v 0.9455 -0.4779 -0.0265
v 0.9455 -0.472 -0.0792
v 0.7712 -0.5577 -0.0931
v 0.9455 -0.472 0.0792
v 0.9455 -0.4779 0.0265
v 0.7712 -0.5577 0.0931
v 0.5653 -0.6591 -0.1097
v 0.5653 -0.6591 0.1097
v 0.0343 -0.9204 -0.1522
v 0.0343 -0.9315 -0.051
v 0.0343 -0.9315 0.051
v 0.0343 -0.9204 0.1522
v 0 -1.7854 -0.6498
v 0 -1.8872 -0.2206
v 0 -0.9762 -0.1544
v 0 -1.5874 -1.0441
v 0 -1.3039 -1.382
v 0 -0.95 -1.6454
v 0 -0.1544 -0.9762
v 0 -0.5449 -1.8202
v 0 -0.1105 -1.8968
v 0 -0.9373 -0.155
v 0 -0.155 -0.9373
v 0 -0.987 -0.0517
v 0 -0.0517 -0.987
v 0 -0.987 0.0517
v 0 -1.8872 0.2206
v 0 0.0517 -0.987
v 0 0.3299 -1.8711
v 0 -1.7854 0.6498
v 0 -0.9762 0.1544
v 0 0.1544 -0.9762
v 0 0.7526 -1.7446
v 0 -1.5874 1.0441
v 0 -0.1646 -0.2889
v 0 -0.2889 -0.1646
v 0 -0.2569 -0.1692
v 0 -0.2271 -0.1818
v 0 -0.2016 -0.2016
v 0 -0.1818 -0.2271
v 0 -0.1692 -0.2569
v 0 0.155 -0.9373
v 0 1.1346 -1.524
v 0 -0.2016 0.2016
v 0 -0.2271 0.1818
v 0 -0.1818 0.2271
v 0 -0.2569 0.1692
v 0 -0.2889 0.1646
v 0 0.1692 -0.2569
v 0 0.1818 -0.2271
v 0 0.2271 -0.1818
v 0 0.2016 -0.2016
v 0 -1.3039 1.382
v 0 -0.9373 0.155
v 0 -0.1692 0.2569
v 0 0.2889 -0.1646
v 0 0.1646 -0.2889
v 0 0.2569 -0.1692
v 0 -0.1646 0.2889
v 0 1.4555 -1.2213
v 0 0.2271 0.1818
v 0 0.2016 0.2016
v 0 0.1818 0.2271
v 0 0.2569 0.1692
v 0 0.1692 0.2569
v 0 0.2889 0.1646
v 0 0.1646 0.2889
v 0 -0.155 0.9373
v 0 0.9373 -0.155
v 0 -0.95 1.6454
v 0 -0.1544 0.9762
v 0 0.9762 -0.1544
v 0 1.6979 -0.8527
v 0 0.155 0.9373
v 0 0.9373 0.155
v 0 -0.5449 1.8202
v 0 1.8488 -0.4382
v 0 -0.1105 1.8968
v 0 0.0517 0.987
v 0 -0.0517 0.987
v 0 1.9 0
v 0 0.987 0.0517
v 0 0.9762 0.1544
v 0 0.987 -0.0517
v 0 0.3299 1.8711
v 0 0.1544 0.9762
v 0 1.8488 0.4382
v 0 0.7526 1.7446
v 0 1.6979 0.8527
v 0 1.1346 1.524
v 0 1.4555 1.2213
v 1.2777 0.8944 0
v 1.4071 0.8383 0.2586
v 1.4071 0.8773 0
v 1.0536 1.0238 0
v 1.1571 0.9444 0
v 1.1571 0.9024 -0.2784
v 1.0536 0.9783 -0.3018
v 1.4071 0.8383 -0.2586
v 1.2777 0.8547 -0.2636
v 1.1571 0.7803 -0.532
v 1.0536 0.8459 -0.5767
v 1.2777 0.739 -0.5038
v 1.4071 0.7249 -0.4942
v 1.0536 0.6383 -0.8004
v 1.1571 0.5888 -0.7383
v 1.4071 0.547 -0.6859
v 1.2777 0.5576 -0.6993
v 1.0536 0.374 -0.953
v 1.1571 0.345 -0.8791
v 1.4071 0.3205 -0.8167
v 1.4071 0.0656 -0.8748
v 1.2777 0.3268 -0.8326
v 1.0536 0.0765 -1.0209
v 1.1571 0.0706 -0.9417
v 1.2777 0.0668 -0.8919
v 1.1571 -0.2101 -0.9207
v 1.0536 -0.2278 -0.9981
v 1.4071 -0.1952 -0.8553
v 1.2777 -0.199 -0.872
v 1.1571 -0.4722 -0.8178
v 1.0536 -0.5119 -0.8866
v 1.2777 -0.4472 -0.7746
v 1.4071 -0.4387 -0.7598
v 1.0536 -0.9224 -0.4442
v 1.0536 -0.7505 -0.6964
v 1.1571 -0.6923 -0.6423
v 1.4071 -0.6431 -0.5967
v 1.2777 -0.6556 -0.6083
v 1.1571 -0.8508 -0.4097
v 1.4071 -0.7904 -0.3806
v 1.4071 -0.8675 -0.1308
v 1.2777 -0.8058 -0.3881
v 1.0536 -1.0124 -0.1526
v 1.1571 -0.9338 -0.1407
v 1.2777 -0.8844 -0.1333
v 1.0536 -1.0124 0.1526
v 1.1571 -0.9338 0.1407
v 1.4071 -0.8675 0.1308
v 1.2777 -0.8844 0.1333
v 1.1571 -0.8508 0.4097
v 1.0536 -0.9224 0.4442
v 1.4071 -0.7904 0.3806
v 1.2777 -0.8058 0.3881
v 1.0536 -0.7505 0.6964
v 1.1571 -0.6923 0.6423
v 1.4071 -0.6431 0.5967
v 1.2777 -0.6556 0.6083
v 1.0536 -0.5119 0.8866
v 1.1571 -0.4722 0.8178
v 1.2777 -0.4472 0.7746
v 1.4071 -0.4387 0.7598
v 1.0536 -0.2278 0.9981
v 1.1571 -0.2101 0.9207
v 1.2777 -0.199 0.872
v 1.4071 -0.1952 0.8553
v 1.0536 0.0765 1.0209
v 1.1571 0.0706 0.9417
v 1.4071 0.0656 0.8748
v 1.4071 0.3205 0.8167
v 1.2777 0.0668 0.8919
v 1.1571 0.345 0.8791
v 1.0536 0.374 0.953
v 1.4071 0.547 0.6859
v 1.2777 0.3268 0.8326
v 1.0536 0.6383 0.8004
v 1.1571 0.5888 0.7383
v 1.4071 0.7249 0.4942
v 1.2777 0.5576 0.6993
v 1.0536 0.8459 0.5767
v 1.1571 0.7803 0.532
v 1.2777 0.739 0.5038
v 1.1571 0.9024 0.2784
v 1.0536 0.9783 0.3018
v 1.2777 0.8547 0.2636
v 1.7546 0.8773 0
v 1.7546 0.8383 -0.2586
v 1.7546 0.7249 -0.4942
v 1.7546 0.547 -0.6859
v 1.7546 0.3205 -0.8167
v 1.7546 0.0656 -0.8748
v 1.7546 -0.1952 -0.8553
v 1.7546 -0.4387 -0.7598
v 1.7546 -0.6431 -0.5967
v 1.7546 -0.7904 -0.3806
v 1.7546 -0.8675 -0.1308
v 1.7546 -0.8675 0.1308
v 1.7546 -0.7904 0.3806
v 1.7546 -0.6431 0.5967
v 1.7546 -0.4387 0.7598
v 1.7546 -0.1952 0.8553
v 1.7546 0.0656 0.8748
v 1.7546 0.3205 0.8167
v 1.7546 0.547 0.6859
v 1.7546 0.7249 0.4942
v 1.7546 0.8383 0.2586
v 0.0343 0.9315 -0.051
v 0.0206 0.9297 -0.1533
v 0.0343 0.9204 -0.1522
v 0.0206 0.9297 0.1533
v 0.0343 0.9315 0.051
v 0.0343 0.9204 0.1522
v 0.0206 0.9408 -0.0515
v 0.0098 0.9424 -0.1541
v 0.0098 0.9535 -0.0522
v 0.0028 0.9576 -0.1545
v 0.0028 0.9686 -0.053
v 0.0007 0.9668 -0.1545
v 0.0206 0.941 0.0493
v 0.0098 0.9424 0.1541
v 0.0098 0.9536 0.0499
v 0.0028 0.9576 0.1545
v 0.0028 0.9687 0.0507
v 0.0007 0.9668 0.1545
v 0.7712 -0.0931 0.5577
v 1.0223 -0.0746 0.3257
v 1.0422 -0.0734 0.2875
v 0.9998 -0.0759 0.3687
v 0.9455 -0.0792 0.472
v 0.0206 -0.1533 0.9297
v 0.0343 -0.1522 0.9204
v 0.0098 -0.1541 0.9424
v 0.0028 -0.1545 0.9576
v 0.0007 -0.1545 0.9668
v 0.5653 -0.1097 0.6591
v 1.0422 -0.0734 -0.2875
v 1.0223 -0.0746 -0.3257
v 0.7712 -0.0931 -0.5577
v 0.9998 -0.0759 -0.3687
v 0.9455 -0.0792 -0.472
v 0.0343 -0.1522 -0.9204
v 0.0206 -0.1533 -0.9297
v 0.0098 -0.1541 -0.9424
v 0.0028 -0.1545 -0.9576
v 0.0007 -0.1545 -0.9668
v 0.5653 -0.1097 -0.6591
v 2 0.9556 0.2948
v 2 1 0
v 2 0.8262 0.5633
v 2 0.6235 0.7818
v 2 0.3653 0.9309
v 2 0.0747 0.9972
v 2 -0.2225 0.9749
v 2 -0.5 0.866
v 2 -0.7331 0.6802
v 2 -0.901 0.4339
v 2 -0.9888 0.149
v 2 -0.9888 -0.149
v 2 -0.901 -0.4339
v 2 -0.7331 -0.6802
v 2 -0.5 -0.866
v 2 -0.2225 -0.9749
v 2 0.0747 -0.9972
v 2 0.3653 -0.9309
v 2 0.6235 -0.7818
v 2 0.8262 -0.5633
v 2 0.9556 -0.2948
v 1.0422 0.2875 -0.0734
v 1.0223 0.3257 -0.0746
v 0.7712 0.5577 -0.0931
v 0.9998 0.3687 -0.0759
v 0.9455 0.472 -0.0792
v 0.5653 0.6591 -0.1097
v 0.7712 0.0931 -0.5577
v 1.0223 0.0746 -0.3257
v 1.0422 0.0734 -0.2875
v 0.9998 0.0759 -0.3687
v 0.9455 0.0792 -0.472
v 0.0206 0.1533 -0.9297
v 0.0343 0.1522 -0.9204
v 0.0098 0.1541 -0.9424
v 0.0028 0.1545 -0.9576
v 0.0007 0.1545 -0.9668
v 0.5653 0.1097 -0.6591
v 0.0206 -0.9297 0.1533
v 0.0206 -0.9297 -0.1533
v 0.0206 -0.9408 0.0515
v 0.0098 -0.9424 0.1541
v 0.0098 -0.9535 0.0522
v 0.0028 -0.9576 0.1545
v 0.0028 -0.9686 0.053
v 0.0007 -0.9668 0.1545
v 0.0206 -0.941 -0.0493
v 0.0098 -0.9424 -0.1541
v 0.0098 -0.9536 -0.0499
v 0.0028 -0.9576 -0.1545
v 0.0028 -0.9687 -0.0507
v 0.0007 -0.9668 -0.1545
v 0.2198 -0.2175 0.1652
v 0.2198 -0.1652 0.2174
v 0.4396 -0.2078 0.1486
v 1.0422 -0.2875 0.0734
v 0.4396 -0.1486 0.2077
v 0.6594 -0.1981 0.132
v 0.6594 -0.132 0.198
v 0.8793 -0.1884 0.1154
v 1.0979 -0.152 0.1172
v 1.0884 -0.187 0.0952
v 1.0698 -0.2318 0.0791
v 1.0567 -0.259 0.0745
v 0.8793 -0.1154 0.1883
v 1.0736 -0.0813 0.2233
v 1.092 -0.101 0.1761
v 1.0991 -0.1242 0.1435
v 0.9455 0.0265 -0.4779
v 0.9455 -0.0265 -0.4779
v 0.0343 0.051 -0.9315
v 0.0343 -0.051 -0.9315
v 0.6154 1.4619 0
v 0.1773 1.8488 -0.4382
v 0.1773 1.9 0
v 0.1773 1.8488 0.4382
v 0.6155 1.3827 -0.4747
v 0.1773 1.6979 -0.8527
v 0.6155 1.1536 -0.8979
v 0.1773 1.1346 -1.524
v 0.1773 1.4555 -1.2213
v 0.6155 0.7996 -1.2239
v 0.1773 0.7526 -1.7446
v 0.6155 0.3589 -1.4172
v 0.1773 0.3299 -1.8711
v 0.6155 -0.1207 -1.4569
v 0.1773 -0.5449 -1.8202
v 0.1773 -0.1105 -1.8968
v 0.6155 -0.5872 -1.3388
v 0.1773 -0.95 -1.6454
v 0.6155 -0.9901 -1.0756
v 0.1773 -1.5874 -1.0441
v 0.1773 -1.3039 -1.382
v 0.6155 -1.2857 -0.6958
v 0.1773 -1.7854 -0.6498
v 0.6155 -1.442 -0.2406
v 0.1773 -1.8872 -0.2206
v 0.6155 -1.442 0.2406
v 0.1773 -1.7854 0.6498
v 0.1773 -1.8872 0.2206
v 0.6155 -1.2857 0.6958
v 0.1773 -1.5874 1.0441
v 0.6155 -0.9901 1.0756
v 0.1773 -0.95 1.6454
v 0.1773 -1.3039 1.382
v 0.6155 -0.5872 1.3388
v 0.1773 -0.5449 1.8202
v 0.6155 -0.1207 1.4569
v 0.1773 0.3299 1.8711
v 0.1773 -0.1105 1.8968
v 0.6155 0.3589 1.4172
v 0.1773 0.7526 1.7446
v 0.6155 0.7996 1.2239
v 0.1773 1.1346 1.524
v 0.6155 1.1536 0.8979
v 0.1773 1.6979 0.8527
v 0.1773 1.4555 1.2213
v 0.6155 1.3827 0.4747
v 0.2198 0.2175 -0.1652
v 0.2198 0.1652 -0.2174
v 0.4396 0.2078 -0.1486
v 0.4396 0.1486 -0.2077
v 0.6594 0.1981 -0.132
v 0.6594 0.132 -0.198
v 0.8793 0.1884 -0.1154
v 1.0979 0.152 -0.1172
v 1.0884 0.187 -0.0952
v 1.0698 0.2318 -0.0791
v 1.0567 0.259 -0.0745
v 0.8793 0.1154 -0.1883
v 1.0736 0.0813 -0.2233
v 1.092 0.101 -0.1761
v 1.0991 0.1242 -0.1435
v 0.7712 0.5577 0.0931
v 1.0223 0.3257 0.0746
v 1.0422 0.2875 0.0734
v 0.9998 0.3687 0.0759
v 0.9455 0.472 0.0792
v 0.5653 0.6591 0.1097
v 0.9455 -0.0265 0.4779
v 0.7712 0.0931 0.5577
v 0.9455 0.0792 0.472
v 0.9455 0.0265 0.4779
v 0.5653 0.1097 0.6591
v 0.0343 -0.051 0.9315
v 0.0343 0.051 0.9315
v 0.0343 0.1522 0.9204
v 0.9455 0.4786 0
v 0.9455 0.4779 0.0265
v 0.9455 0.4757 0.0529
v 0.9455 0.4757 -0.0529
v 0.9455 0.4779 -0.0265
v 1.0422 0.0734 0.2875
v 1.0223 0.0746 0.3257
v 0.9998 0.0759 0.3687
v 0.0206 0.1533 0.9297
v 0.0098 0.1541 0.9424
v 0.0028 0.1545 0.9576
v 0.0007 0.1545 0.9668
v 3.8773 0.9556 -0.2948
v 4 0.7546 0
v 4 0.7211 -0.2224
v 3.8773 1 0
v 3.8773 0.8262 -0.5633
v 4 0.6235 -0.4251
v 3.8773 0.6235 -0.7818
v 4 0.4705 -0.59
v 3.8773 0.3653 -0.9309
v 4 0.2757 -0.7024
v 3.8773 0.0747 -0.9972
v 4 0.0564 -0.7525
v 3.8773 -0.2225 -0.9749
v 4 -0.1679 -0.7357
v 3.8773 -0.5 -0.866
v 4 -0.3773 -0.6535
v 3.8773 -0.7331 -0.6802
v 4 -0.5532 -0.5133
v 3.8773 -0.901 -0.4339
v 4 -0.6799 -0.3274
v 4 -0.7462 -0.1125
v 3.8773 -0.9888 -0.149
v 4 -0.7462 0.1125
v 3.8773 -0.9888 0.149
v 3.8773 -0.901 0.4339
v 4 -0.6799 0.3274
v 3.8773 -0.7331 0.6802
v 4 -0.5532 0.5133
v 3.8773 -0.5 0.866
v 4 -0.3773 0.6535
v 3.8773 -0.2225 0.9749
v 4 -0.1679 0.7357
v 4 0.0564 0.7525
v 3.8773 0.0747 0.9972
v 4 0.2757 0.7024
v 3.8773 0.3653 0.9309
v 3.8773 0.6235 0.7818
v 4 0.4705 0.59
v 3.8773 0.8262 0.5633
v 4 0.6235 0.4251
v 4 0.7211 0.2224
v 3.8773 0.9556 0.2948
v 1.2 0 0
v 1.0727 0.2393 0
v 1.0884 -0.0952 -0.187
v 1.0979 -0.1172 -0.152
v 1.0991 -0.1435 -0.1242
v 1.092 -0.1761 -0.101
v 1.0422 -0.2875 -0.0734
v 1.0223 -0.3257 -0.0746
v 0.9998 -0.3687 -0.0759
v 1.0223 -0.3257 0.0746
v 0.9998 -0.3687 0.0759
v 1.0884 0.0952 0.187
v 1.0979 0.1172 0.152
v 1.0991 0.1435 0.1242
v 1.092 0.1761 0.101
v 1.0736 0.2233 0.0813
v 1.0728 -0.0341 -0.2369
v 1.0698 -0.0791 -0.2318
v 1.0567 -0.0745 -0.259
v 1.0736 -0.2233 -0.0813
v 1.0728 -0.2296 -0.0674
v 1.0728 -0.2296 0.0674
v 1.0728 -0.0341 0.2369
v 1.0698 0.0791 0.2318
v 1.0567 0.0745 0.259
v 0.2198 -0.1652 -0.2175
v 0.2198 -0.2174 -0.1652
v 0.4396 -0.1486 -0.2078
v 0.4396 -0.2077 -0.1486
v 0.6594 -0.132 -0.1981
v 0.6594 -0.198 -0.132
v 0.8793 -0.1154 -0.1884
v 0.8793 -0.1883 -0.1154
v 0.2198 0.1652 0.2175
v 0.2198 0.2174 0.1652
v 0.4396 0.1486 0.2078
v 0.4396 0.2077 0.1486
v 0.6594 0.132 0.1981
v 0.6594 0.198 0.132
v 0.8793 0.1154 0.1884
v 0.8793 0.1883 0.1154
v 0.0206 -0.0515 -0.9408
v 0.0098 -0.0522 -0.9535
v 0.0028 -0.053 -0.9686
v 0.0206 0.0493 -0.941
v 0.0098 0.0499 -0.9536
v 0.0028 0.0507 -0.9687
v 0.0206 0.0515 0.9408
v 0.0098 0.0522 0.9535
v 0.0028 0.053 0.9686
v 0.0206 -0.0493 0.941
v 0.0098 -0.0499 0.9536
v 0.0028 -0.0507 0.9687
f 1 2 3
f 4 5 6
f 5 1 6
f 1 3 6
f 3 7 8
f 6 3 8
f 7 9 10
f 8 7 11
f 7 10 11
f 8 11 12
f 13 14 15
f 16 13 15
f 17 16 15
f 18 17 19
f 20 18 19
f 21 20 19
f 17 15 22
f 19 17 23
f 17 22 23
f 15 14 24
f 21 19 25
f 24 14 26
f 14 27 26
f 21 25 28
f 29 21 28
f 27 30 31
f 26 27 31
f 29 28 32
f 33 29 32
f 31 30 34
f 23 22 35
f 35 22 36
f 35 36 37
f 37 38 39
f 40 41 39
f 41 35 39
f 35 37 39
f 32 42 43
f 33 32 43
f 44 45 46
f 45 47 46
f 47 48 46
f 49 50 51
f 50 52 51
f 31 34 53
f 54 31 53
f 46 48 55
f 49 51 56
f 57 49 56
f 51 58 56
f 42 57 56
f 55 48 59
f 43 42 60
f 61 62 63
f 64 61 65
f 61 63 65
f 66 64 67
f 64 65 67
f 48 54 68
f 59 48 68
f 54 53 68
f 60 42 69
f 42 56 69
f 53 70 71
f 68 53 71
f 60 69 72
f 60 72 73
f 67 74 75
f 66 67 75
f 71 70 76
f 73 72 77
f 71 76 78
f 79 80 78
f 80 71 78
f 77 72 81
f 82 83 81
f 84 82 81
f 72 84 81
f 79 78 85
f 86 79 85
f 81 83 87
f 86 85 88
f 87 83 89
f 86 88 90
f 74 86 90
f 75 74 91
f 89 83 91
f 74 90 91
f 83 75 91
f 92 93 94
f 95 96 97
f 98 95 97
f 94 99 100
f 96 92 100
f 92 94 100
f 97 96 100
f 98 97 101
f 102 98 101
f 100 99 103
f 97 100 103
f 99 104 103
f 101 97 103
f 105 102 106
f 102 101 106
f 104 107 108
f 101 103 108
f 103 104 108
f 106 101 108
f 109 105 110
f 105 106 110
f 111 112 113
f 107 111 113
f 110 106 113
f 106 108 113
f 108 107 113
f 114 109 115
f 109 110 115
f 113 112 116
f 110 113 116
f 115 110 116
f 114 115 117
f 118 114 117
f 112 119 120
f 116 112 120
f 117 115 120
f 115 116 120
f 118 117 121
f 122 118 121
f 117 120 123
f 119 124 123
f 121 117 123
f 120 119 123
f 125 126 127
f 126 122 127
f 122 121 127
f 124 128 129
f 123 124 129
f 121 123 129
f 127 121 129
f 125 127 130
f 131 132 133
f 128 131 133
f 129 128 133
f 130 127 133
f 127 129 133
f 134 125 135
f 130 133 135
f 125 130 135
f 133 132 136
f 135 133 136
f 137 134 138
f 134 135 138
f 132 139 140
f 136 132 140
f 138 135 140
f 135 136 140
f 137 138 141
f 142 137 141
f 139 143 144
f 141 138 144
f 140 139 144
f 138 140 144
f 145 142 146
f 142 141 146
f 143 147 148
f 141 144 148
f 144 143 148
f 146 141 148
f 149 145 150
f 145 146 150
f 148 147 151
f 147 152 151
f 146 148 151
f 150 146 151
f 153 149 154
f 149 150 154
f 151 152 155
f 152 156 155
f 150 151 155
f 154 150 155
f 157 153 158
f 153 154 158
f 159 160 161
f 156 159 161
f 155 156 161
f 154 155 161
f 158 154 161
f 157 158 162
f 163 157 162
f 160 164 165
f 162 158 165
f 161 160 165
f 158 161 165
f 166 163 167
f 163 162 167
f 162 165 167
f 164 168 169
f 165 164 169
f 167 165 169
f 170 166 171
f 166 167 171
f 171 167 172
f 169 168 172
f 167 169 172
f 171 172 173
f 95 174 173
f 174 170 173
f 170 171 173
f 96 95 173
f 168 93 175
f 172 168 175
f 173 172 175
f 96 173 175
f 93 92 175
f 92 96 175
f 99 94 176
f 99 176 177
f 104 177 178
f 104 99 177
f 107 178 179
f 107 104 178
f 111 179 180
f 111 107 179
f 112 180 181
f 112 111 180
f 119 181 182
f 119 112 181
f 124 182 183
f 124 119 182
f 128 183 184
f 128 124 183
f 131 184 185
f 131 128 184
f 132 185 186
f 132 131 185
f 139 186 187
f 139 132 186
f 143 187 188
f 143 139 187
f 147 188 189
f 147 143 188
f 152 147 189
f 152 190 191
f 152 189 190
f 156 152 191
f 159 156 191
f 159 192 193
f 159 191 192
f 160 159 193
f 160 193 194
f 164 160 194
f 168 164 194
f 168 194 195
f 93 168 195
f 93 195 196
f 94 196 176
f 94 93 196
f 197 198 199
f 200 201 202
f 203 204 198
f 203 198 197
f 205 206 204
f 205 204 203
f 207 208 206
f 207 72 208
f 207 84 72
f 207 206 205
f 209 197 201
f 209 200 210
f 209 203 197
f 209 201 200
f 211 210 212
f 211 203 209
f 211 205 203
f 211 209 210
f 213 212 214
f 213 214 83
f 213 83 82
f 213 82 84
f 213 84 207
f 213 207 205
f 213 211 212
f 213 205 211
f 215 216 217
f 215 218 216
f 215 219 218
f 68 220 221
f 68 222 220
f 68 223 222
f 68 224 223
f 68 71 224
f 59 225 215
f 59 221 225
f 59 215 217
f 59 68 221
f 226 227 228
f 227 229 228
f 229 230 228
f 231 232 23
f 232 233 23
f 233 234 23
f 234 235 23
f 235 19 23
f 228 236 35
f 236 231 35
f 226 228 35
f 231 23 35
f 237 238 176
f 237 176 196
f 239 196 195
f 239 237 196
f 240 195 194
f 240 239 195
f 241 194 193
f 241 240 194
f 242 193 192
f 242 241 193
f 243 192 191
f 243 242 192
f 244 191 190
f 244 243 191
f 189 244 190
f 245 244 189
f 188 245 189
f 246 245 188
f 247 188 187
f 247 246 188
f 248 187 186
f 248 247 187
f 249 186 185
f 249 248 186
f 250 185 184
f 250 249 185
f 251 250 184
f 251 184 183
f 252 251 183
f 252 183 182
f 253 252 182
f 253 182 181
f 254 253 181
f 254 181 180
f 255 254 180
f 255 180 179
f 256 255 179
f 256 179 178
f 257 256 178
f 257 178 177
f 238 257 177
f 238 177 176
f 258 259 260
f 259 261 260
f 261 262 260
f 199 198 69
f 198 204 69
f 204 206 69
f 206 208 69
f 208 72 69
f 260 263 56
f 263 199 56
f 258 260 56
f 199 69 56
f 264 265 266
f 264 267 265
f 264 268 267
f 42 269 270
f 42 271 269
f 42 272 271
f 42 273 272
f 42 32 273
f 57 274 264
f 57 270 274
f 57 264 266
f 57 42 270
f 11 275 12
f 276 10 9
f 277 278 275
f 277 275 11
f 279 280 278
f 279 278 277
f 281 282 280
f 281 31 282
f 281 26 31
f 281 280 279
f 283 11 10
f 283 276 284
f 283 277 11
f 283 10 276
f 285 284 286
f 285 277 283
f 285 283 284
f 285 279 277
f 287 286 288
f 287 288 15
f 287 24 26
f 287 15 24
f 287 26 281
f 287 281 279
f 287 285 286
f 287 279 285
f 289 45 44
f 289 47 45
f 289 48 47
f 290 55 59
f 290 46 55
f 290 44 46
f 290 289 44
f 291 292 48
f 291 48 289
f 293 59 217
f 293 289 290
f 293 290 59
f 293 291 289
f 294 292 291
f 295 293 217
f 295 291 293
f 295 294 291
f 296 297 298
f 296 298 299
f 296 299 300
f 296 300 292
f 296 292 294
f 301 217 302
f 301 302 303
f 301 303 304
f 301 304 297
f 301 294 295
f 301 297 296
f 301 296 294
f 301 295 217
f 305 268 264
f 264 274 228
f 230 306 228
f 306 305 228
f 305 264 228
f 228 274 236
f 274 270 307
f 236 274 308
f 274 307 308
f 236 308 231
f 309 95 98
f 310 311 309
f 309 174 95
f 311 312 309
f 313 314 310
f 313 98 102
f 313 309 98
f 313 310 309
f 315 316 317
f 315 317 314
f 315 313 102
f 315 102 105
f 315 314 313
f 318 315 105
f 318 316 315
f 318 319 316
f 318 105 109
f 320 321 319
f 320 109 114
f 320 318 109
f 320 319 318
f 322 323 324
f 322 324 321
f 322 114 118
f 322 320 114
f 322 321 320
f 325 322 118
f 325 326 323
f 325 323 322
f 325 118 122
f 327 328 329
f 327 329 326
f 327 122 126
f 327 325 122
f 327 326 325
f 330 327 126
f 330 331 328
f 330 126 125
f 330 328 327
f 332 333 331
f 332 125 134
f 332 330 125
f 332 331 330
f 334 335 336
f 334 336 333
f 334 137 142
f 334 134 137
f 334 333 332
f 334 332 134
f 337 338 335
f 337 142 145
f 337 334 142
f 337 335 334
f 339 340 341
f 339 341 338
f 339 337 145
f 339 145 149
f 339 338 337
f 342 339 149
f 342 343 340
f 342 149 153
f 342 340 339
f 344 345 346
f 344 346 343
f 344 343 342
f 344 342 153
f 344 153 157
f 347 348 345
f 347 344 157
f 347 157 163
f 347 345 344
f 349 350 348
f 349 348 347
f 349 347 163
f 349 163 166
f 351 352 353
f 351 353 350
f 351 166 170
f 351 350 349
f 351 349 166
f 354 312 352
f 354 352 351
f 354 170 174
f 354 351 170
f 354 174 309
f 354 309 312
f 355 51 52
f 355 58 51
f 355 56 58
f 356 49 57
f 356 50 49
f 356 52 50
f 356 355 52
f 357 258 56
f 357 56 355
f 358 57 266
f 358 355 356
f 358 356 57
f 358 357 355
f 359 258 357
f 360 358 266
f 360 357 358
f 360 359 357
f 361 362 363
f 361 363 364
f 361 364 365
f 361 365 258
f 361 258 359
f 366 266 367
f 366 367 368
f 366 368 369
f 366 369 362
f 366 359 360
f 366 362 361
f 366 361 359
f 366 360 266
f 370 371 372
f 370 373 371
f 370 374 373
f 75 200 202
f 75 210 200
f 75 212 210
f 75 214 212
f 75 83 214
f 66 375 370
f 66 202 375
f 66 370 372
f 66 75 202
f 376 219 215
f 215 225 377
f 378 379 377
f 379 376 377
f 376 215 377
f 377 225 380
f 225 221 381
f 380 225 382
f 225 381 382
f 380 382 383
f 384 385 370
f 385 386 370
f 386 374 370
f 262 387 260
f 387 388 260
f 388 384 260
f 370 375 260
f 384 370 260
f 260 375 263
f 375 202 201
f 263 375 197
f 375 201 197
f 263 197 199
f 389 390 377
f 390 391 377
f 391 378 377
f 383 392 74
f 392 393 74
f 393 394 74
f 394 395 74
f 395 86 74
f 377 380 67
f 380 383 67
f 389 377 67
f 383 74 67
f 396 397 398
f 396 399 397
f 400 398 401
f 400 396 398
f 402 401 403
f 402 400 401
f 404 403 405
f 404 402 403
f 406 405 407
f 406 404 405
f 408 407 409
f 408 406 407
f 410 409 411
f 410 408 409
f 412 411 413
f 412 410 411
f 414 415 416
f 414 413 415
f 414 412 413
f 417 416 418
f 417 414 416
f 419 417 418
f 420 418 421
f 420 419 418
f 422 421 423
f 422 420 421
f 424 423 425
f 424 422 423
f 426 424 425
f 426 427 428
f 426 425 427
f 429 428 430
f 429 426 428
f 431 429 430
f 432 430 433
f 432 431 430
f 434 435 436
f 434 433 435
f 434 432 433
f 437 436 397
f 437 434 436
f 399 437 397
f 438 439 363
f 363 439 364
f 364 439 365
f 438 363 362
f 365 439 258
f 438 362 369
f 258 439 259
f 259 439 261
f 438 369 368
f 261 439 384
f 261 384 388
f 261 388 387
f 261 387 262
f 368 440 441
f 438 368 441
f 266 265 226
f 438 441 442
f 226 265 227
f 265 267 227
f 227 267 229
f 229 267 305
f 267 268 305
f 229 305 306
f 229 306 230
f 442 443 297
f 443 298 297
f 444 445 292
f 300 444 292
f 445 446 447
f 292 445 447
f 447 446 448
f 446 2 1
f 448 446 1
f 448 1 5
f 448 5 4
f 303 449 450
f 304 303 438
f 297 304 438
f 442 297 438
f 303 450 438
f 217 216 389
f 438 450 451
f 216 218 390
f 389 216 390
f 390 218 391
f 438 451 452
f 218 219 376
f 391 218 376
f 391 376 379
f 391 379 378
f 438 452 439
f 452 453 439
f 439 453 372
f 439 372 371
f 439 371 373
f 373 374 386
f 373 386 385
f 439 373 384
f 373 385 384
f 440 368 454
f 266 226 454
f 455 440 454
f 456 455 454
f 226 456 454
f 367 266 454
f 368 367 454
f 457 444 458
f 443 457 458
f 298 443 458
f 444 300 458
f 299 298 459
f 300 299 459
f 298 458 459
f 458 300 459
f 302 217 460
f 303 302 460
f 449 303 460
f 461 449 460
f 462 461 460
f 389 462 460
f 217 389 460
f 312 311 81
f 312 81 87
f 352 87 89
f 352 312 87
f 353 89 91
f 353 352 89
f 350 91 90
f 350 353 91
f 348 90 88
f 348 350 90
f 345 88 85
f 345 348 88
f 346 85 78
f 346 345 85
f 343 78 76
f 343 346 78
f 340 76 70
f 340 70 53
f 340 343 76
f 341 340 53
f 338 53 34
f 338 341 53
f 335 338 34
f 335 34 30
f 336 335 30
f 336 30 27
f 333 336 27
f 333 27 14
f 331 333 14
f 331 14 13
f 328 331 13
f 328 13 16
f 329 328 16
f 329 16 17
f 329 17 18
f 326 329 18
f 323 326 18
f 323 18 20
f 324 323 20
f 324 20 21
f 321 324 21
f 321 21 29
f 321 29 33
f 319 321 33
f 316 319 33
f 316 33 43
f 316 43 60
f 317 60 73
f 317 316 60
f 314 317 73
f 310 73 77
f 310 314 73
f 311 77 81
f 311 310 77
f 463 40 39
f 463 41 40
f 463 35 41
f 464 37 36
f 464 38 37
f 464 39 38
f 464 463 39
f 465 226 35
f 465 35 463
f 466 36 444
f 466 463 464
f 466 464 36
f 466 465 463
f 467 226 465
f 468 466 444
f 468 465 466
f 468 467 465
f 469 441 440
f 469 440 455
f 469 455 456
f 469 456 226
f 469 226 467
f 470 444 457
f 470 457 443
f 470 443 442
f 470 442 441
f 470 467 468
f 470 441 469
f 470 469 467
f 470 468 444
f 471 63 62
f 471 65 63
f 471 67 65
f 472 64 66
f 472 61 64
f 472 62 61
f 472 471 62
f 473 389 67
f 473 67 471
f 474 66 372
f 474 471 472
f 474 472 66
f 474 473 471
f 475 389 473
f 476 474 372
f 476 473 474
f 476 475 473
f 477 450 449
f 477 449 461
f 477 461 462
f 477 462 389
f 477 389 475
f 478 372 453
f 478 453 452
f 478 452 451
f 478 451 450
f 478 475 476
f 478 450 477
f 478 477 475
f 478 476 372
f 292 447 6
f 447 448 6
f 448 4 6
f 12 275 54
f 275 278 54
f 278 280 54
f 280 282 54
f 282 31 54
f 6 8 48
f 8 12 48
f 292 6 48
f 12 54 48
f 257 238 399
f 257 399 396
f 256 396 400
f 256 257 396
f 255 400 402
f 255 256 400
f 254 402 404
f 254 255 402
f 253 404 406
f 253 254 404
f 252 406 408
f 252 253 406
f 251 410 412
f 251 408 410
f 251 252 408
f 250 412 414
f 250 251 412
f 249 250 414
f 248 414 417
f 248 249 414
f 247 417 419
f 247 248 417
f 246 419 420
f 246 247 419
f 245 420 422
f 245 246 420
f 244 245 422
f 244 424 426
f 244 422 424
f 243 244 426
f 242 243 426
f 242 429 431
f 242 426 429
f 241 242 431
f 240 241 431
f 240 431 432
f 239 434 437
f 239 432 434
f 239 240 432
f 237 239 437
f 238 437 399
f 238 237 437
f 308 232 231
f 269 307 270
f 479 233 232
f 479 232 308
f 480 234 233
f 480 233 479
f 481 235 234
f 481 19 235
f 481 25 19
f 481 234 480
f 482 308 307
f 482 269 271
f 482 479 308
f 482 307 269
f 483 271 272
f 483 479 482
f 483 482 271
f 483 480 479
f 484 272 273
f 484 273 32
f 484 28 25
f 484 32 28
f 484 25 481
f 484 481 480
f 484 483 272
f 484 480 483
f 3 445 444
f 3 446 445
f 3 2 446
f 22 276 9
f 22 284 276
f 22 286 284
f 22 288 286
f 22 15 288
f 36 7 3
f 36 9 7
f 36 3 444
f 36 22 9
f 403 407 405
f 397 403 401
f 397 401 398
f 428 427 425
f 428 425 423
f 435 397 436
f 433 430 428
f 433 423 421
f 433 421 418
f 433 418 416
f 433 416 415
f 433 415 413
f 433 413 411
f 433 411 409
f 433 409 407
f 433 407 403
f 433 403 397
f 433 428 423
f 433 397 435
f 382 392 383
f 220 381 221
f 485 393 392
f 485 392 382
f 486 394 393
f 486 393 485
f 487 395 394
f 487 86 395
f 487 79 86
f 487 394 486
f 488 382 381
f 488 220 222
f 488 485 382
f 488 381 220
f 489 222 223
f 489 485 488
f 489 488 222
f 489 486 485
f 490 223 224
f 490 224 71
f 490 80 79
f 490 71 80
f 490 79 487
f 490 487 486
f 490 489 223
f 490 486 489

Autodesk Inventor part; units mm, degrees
ref_plane "YZ Plane" through (0, 0, 0) normal (1, 0, 0) x (0, 1, 0)
ref_plane "XZ Plane" through (0, 0, 0) normal (0, 1, 0) x (-1, 0, 0)
sketch "Sketch1" plane through (0, 0, 0) normal (0, 0, 1) x (1, 0, 0)
  line L0 (1.2, 0) -> (4, 0)
  line L1 (4, 0) -> (4, 1)
  line L2 (4, 1) -> (2, 1)
  line L3 (2, 1) -> (1.7546, 0.8773)
  line L4 (1.7546, 0.8773) -> (1.4071, 0.8773)
  line L5 (0, 1.9) -> (0, 0.95)
  line L6 (0, 0.95) -> (0.9455, 0.4786)
  line L7 (0.9455, 0.4786) -> (1.2, 0)
  line L8 (-0.8, 0) -> (4.8, 0) projected
  line L9 (0, -0.38) -> (0, 2.28) projected
  line L10 (0, 1.9) -> (0.1773, 1.9)
  line L11 (0.1773, 1.9) -> (1.0536, 1.0238)
  line L12 (2, 1) -> (1.0773, 1) construction
  arc A0 (1.0536, 1.0238) -> (1.4071, 0.8773) centre (1.4071, 1.3773) ccw
  point P0 (1.2, 0.8773)
  dimension "d1" = 2
  dimension "d2" = 2
  dimension "d3" = 1.7546
  dimension "d4" = 1.9
  dimension "d5" = 26.5
  dimension "d6" = 62
  dimension "d7" = 1.2
  dimension "d8" = 0.2454
  dimension "d12" = 3.8
  dimension "d13" = 45
  dimension "d15" = 4
  dimension "d24" = 1.2
  dimension "d93" = 0.5
revolve "Body" add sketch "Sketch1" angle 360 about axis through (1.2, 0, 0) along (1, 0, 0) contours L7 L6 L5 L10 L11 A0 L4 L3 L2 L1 L0
sketch "Sketch2" plane through (0, 0, 0) normal (-1, 0, 0) x (0, 0, 1)
  line L0 (0, 0.95) -> (0, 0) construction
  line L1 (0, 0) -> (0.95, 0) construction
  arc A0 (0.285, 0) -> (0, 0.285) centre (0, 0) ccw construction
  arc A1 (0.3325, 0) -> (0, 0.3325) centre (0, 0) ccw construction
  arc A2 (0.9373, 0.155) -> (0.155, 0.9373) centre (0, 0) ccw
  line L2 (0, 0) -> (0.6718, 0.6718) construction
  line L3 (0.155, 0.9373) -> (0.1646, 0.2889)
  line L4 (0.9373, 0.155) -> (0.2889, 0.1646)
  arc A3 (0.155, 0.9373) -> (0, 0.95) centre (0, 0) ccw
  arc A4 (0.95, 0) -> (0.9373, 0.155) centre (0, 0) ccw
  line L5 (0, -2.66) -> (0, 2.66) projected
  line L6 (-2.66, 0) -> (2.66, 0) projected
  arc A5 (0.155, -0.9373) -> (0.9373, -0.155) centre (0, 0) ccw
  line L7 (0.155, -0.9373) -> (0.1646, -0.2889)
  line L8 (0.9373, -0.155) -> (0.2889, -0.1646)
  arc A6 (0, -0.95) -> (0.155, -0.9373) centre (0, 0) ccw
  arc A7 (0.9373, -0.155) -> (0.95, 0) centre (0, 0) ccw
  arc A8 (-0.155, 0.9373) -> (-0.9373, 0.155) centre (0, 0) ccw
  line L9 (-0.155, 0.9373) -> (-0.1646, 0.2889)
  line L10 (-0.9373, 0.155) -> (-0.2889, 0.1646)
  arc A9 (0, 0.95) -> (-0.155, 0.9373) centre (0, 0) ccw
  arc A10 (-0.9373, 0.155) -> (-0.95, 0) centre (0, 0) ccw
  arc A11 (-0.155, -0.9373) -> (0, -0.95) centre (0, 0) ccw
  arc A12 (-0.9373, -0.155) -> (-0.155, -0.9373) centre (0, 0) ccw
  arc A13 (-0.95, 0) -> (-0.9373, -0.155) centre (0, 0) ccw
  line L11 (-0.9373, -0.155) -> (-0.2889, -0.1646)
  line L12 (-0.155, -0.9373) -> (-0.1646, -0.2889)
  arc A14 (0.1646, 0.2889) -> (0.2889, 0.1646) centre (0.2908, 0.2908) ccw
  arc A15 (0.2889, -0.1646) -> (0.1646, -0.2889) centre (0.2908, -0.2908) ccw
  arc A16 (-0.2889, 0.1646) -> (-0.1646, 0.2889) centre (-0.2908, 0.2908) ccw
  arc A17 (-0.1646, -0.2889) -> (-0.2889, -0.1646) centre (-0.2908, -0.2908) ccw
  point P0 (0.6718, -0.6718)
  point P1 (-0.6718, 0.6718)
  point P2 (-0.6718, -0.6718)
  dimension "d17" = 0.57
  dimension "d18" = 0.665
  dimension "d19" = 1.9
  dimension "d20" = 45
  dimension "d21" = 0.155
extrude "Slot" add sketch "Sketch2" against normal up to next draft 5 contours L4 A14 L3 A2 | A5 L7 A15 L8 | L9 A16 L10 A8 | A12 L11 A17 L12
fillet "Fillet1" radius 0.062 4 edges at (0, 0.95, 0) (0, 0, -0.95) (0, -0.95, 0) (0, 0, 0.95)
thread "Thread" size "M2x0.4" class "6g" standard "ISO Metric profile" length 2
chamfer "Chamfer1" distance 0.2454 distance2 0.1227 1 edges at (4, -1, 0) measured on face at (4, 0.479, -0.3842)
ref_plane "Work Plane2" through (3.35, 0, 0) normal (0, 0, -1) x (1, 0, 0)
equation "\"d1\" = GEL"
equation "\"d2\" = GD"
equation "\"d3\" = BDM"
equation "\"d4\" = SDM"
equation "\"d7\" = INTI"
equation "\"d8\" = GAL"
equation "\"d12\" = KOD"
equation "\"d13\" = 0.5 * SEWI"
equation "\"d15\" = NLG"
equation "\"d24\" = KOH"
equation "\"d93\" = R"
equation "\"d17\" = 0.3 * SDM"
equation "\"d18\" = 0.35 * SDM"
equation "\"d19\" = SDM"
equation "\"d21\" = 0.5 * SBR"
equation "\"d23\" = 0.2 * SBR"
equation "\"d10\" = GEL"
equation "\"d25\" = -0.5 * SPD + 0.5 * GD"
equation "\"d26\" = 0.5 * GAL"
equation "\"NLG\" = 4"
equation "\"GEL\" = 2"
equation "\"GAL\" = 0.61345 * PTC"
equation "\"SPD\" = NND - 1.2269 * PTC"
equation "\"KOD\" = 3.8"
equation "\"KOH\" = 1.2"
equation "\"SBR\" = 0.31"
equation "\"INTI\" = 1.2"
equation "\"SDM\" = 1.9"
equation "\"GD\" = NND"
equation "\"BDM\" = NND - GAL"
equation "\"SEWI\" = 90deg"
equation "\"d9\" = SDM"
equation "\"R\" = 0.5"
equation "\"GUL\" = 0.61345 * PTC"
equation "\"TOA\" = 30deg"
equation "\"EPV\" = 2.2"
equation "\"THREADDIA\" = 2"
equation "\"PTC\" = 0.4"
equation "\"NND\" = 2"
equation "\"GD1\" = THREADDIA - 1.2269 * PTC"
properties part number "ISO 7046-1  - M2 x 4 - 4.8 - H" material "Steel"
